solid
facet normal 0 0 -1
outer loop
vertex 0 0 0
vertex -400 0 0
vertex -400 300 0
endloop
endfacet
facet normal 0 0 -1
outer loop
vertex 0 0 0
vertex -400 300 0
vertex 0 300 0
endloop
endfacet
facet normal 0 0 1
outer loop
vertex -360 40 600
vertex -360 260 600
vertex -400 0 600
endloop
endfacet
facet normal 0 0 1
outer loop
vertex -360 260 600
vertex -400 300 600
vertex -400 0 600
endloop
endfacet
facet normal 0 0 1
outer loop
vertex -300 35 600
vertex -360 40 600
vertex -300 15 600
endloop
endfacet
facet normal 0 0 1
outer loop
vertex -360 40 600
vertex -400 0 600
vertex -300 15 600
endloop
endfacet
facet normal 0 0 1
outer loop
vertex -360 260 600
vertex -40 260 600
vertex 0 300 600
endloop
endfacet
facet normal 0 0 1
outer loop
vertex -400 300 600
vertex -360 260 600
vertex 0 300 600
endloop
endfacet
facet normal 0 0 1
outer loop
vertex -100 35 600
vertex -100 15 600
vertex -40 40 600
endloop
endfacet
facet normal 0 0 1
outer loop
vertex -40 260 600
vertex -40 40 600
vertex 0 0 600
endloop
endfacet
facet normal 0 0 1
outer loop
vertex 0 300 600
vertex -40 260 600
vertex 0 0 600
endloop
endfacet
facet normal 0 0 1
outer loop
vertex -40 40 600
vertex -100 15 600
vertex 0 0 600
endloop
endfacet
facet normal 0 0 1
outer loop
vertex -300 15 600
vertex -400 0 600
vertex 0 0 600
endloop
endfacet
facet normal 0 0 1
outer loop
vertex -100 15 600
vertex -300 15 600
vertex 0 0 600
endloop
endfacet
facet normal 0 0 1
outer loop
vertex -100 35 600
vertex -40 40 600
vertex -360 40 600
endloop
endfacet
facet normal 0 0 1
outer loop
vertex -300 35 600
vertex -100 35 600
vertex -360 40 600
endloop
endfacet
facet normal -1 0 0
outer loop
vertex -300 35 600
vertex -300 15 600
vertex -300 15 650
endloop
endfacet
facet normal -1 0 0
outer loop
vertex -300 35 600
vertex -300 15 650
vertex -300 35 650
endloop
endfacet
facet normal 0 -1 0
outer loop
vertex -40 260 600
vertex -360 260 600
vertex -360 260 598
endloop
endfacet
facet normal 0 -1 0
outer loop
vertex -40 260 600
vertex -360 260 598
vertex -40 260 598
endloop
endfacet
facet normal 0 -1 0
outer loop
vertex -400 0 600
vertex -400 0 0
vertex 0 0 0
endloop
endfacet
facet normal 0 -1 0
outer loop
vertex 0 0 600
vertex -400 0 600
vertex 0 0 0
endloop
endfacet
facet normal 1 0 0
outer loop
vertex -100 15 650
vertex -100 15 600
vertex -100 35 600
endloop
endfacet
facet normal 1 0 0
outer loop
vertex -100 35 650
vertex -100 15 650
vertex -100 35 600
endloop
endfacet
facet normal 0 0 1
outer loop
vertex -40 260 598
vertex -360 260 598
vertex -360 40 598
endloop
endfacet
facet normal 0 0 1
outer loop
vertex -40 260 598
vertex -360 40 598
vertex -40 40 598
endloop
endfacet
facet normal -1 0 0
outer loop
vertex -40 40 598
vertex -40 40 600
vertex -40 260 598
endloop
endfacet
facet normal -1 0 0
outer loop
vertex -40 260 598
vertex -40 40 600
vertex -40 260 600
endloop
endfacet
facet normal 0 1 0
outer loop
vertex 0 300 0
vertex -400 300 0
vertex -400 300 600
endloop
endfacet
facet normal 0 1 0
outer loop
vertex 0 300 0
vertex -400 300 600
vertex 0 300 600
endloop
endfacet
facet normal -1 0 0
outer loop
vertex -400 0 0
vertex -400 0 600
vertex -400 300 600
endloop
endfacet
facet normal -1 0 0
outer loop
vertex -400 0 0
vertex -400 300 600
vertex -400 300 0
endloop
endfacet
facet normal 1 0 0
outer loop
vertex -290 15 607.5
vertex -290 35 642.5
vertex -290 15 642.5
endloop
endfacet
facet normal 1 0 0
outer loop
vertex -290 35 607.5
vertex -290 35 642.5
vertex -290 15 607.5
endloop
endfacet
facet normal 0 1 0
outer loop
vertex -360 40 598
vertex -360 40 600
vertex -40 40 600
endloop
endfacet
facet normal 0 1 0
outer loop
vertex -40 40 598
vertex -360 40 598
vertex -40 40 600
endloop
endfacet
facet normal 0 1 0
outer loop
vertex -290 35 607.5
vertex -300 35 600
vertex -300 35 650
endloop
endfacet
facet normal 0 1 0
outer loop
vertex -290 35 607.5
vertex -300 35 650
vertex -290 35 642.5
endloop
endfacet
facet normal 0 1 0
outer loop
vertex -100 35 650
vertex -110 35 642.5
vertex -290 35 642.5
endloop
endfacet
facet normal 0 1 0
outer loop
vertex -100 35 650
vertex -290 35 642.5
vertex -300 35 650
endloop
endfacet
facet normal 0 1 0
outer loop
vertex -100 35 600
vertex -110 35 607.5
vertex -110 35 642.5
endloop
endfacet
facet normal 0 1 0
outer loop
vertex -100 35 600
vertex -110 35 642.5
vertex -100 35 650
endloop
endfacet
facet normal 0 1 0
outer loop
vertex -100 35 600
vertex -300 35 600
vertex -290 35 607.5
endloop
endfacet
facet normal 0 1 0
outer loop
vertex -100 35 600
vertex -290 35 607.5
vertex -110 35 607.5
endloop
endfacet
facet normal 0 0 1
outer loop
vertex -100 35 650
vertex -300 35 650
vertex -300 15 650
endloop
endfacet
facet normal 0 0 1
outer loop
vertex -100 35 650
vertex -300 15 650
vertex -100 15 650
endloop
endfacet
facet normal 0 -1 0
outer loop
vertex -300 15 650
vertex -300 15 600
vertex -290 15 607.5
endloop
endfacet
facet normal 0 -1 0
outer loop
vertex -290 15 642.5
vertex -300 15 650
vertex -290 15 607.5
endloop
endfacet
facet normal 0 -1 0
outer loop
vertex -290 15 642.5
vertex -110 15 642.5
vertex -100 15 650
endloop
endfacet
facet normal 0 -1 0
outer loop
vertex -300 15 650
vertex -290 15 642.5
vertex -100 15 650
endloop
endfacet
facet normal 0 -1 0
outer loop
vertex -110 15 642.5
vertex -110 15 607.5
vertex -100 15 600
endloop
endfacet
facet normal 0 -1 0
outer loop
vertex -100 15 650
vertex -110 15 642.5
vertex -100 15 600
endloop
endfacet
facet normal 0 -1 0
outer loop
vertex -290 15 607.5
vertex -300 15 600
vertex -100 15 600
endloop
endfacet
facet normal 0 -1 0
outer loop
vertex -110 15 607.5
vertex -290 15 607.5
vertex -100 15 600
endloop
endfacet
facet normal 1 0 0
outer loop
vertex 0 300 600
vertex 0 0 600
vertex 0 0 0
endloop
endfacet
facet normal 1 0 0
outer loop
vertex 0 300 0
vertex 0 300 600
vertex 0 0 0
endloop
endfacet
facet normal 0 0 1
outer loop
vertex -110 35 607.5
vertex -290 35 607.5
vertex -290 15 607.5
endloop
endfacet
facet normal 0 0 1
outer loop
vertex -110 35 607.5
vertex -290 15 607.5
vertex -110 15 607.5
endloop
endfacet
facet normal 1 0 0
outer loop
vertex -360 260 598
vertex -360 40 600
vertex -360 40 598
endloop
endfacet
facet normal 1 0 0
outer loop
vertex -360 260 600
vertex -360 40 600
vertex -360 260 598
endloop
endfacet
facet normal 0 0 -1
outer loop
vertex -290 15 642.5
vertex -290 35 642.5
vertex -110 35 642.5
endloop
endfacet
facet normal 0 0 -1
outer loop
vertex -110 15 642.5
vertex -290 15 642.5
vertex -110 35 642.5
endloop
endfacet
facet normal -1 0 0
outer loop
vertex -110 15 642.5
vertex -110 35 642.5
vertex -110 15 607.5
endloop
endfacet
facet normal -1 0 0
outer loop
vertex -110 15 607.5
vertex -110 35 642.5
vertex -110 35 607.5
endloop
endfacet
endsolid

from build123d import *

# Parameters (mm, degrees)
SKETCH_1_W          = 400
SKETCH_1_H          = 600
EXTRUDE_1_DEPTH     = 300
SKETCH_2_W          = 200
SKETCH_2_H          = 20
EXTRUDE_2_DEPTH     = 50
SKETCH_3_W          = 180
SKETCH_3_H          = 35
CUT_EXTRUDE_1_DEPTH = 50
SKETCH_4_W          = 320
SKETCH_4_H          = 220
CUT_EXTRUDE_2_DEPTH = 2


with BuildPart() as part:
    # Эскиз1 → Бобышка-Вытянуть1 (new body)
    with BuildSketch(Plane(origin=(0, 0, 0), x_dir=(1, 0, 0), z_dir=(0, 1, 0))):
        with Locations((-200, -300)):
            Rectangle(SKETCH_1_W, SKETCH_1_H)
    extrude(amount=EXTRUDE_1_DEPTH)

    # Эскиз2 → Бобышка-Вытянуть2 (add)
    with BuildSketch(Plane.XY.offset(600)):
        with Locations((-200, 25)):
            Rectangle(SKETCH_2_W, SKETCH_2_H)
    extrude(amount=EXTRUDE_2_DEPTH)

    # Эскиз3 → Вырез-Вытянуть1 (cut)
    with BuildSketch(Plane(origin=(0, 35, 0), x_dir=(1, 0, 0), z_dir=(0, 1, 0))):
        with Locations((-200, -625)):
            Rectangle(SKETCH_3_W, SKETCH_3_H)
    extrude(amount=-CUT_EXTRUDE_1_DEPTH, mode=Mode.SUBTRACT)

    # Эскиз4 → Вырез-Вытянуть2 (cut)
    with BuildSketch(Plane.XY.offset(600)):
        with Locations((-200, 150)):
            Rectangle(SKETCH_4_W, SKETCH_4_H)
    extrude(amount=-CUT_EXTRUDE_2_DEPTH, mode=Mode.SUBTRACT)


solid = part.part
